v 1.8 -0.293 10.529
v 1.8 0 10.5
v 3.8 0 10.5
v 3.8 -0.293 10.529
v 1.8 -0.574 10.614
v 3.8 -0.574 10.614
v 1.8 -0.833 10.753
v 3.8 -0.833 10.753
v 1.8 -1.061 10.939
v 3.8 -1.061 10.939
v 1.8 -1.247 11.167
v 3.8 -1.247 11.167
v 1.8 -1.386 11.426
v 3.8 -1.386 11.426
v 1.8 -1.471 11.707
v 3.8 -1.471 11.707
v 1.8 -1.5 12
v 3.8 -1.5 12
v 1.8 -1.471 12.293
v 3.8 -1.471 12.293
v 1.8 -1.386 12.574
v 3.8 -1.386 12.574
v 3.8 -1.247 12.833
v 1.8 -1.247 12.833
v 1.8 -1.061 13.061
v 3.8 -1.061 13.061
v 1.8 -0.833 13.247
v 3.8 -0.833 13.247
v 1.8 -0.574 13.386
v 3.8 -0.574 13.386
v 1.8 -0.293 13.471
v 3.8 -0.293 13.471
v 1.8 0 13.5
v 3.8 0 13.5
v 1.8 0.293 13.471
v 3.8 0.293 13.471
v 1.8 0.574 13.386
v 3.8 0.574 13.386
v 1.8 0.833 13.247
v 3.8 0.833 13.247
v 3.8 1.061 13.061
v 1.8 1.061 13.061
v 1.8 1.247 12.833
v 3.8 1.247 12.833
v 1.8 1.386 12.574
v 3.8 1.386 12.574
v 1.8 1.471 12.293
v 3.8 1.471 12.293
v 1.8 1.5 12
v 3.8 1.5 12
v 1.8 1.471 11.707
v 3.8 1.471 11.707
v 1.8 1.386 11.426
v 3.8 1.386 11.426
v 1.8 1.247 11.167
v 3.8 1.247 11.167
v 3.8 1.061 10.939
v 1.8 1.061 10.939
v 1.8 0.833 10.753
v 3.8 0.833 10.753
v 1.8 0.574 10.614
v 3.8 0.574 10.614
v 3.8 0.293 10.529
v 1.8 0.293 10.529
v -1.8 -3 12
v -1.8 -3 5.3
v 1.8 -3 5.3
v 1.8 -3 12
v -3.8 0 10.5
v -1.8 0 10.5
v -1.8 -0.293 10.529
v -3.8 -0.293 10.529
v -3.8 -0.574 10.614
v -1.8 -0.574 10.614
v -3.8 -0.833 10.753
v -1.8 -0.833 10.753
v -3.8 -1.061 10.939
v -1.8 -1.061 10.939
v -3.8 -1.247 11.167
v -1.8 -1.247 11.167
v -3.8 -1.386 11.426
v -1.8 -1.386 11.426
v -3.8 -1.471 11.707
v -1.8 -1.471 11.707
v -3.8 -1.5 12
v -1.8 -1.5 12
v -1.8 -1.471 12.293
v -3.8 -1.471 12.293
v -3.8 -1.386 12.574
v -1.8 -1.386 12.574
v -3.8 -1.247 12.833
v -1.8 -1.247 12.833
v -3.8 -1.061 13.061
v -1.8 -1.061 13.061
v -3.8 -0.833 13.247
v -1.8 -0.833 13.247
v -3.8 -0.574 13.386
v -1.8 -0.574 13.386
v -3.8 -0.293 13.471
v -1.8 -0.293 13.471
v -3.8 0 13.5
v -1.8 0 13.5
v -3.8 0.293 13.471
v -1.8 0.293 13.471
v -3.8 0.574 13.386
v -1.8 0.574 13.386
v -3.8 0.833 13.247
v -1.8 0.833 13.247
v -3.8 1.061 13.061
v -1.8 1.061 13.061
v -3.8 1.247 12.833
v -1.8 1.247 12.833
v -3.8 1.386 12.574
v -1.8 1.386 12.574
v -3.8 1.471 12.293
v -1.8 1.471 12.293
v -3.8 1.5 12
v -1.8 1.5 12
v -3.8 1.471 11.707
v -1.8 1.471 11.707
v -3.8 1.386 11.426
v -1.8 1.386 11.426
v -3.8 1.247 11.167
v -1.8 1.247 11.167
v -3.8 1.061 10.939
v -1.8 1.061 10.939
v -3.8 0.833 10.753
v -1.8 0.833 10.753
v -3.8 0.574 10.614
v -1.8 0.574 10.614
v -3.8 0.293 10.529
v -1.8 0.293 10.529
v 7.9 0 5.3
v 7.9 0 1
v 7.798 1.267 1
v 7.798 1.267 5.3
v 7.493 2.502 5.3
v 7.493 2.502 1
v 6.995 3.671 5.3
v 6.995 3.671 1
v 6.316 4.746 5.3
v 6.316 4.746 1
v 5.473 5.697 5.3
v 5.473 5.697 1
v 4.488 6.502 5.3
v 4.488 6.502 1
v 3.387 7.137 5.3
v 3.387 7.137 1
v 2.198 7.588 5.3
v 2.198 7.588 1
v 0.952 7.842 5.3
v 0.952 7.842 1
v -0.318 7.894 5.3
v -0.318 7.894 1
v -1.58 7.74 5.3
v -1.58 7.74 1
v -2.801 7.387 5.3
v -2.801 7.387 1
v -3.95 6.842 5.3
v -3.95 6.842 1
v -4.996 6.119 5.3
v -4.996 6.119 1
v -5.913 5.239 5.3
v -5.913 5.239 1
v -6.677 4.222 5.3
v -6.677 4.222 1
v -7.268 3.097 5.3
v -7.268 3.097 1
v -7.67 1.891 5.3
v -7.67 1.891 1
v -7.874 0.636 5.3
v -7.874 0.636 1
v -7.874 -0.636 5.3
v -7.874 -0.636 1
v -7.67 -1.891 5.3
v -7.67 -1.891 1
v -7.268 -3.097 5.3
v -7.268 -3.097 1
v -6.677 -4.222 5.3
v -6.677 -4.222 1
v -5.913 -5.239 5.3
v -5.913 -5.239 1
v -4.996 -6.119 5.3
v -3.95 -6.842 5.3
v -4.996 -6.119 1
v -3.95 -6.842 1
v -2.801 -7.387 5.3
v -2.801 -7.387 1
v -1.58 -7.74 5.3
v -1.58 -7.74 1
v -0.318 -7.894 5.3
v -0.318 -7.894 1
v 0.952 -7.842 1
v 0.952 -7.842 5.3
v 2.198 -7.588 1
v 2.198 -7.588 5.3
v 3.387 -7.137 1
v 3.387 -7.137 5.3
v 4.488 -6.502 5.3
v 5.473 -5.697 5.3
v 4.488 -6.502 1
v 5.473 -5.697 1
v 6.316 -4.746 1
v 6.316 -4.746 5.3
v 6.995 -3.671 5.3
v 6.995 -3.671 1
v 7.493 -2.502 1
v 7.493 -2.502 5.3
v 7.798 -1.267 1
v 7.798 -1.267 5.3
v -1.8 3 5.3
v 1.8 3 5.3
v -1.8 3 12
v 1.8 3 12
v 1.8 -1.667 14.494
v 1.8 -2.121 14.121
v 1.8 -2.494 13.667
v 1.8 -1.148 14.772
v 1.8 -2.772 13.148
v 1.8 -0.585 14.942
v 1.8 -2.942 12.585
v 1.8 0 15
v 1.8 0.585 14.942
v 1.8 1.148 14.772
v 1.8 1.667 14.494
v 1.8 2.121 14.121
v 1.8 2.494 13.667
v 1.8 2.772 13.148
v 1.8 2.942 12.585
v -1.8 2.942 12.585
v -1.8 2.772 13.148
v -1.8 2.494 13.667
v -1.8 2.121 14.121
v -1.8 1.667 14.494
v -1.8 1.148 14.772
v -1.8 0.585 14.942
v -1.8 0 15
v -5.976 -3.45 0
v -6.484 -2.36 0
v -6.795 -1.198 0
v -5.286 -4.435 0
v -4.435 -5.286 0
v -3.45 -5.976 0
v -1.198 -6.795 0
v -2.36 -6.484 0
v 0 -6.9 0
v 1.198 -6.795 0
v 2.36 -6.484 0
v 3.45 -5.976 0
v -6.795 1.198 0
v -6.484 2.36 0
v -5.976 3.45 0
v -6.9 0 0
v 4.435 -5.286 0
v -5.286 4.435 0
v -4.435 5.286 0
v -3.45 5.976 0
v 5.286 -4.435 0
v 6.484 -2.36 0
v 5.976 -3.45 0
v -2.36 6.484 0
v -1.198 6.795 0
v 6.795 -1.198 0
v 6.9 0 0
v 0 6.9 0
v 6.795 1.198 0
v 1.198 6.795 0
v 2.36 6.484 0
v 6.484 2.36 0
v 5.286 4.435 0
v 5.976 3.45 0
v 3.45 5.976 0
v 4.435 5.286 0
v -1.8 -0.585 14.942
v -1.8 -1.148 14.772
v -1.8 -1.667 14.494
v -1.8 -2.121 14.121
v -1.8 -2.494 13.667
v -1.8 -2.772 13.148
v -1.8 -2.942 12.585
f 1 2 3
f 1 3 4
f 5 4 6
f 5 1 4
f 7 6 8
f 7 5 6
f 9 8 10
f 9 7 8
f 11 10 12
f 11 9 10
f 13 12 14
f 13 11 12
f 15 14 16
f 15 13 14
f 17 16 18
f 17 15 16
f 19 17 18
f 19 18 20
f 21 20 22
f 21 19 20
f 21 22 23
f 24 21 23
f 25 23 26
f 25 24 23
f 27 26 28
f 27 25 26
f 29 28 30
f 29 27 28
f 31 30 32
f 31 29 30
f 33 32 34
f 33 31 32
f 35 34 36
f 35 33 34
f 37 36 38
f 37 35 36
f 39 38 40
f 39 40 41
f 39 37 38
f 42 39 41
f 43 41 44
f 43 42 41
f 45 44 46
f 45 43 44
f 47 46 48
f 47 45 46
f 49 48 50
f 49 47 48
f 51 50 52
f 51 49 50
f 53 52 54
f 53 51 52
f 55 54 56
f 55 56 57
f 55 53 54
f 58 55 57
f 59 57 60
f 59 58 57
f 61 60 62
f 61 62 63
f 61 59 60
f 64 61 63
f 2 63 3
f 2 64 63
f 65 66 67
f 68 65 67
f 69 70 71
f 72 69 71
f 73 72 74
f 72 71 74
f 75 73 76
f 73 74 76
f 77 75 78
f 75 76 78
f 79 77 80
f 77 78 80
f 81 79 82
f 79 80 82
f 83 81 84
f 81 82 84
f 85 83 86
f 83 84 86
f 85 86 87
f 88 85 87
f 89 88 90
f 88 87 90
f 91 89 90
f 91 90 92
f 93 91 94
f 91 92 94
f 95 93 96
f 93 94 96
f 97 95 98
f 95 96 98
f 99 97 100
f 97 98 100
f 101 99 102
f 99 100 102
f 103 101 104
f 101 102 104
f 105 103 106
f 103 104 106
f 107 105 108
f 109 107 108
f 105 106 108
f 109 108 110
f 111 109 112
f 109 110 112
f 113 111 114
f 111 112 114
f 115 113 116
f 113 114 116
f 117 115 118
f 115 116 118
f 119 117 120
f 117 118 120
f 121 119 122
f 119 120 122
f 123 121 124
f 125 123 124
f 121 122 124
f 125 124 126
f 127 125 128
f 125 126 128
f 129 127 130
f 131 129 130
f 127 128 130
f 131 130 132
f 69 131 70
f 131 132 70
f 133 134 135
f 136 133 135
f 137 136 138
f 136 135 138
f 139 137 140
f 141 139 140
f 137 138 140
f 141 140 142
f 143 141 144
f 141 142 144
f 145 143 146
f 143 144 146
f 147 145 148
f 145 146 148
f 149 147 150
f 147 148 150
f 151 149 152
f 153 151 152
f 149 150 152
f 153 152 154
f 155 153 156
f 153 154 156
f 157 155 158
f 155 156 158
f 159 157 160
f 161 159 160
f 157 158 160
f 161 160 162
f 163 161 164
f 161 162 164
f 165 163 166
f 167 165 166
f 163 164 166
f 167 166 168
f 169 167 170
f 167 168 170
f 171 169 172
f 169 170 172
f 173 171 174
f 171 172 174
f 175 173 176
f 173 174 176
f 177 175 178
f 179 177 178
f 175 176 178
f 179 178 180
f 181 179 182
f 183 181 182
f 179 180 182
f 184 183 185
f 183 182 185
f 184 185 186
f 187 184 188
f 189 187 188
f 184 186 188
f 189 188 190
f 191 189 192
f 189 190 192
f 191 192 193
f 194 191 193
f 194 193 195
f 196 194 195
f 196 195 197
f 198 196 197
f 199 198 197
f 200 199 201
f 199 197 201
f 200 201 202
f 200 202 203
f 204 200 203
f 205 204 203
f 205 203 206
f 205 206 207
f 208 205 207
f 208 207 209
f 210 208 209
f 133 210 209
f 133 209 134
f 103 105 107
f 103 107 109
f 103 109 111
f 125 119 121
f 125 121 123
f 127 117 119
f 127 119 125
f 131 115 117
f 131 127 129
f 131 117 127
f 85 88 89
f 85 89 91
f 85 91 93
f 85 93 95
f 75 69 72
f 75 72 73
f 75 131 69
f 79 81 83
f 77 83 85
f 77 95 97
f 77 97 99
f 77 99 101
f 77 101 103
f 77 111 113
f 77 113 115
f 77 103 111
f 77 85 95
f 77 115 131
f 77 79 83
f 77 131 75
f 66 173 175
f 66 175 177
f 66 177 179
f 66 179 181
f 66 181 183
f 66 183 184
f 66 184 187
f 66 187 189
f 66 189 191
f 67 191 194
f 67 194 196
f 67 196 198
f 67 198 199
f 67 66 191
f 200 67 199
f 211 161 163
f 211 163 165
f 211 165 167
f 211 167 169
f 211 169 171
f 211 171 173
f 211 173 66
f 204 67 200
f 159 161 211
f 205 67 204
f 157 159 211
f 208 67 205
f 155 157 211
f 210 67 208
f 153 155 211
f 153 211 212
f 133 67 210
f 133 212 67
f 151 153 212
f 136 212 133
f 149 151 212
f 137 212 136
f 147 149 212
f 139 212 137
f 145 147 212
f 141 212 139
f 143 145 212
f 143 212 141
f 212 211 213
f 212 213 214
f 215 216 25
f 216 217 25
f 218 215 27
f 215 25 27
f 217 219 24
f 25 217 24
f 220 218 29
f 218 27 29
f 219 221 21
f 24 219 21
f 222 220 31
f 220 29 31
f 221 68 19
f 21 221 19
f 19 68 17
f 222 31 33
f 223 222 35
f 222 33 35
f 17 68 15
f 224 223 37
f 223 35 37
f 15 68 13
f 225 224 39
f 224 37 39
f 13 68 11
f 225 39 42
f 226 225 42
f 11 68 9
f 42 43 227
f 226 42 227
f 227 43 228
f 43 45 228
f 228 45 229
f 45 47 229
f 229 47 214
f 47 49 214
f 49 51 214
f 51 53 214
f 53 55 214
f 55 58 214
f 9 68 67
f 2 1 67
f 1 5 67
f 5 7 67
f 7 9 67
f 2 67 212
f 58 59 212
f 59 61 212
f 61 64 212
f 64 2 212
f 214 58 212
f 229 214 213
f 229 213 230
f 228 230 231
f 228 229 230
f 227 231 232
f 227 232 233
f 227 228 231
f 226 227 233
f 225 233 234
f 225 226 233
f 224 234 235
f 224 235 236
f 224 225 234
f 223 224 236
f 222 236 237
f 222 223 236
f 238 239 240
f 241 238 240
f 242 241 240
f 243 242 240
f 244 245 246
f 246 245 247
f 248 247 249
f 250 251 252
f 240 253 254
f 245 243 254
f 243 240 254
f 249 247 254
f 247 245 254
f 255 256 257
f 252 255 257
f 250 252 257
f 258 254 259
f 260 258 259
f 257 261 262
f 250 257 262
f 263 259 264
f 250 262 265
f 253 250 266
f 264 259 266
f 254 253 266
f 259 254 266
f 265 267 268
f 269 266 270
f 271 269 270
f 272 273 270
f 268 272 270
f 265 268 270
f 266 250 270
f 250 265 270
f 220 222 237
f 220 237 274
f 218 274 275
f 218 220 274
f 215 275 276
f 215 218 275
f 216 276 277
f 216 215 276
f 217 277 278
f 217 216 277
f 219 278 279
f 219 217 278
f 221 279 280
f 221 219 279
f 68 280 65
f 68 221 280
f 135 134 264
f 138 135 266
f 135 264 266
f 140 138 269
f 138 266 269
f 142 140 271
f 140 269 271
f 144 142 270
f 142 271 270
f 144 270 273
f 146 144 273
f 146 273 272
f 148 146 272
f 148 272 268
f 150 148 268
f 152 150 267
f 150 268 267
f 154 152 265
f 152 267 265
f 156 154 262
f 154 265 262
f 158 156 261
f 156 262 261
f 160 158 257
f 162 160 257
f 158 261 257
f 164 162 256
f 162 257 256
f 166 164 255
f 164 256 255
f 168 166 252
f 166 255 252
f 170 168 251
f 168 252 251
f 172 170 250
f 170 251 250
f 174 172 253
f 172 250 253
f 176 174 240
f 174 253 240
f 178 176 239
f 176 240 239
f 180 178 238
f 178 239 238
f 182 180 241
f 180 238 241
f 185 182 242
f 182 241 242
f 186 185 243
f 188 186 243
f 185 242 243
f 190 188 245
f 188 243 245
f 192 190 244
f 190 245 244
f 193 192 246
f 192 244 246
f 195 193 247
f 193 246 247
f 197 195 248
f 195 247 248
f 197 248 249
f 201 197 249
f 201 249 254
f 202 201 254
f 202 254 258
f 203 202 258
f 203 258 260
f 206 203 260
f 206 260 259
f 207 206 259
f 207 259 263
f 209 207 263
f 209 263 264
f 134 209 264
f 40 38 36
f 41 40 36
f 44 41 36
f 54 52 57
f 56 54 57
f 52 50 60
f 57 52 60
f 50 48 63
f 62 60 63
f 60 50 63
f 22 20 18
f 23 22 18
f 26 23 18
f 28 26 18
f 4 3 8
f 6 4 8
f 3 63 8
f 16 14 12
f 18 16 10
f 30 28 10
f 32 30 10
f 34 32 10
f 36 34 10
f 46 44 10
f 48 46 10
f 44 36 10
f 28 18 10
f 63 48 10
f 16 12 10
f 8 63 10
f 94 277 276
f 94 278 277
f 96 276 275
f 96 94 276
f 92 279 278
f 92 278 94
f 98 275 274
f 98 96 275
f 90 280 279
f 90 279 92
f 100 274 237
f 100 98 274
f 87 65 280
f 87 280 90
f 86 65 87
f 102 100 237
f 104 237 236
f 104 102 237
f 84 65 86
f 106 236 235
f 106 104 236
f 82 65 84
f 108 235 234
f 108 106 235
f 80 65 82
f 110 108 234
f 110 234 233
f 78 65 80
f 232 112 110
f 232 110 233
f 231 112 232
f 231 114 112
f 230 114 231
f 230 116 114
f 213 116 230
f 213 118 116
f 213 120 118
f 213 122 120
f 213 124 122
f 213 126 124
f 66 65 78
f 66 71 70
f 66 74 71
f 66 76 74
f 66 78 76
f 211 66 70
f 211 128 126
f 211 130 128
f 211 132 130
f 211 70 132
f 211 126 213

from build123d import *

# Parameters (mm, degrees)
SKETCH_1_R          = 7.9
EXTRUDE_1_DEPTH     = 5.3
SKETCH_2_W          = 3.6
SKETCH_2_H          = 6
EXTRUDE_2_DEPTH     = 9.7
CUT_EXTRUDE_START   = -3.6
CUT_EXTRUDE_1_DEPTH = 3.6
CHAMFER_1_SIZE      = 1
SKETCH_4_R          = 1.5
EXTRUDE_3_DEPTH     = 2


# Read off the part's stored shape, not the designer's step: 切除-拉伸1
with BuildPart() as part:
    # 草图1 → 凸台-拉伸1 (new body)
    with BuildSketch(Plane.XY):
        Circle(SKETCH_1_R)
    extrude(amount=EXTRUDE_1_DEPTH)

    # 草图2 → 凸台-拉伸2 (add)
    with BuildSketch(Plane.XY.offset(5.3)):
        Rectangle(SKETCH_2_W, SKETCH_2_H)
    extrude(amount=EXTRUDE_2_DEPTH)

    # 切除-拉伸1 outline → 切除-拉伸1 (cut)
    with BuildSketch(Plane.ZY.offset(1.8).offset(CUT_EXTRUDE_START)):
        with BuildLine():
            Line((15, 3), (12, 3))
            ThreePointArc((12, 3), (14.121320344, 2.121320344), (15, 0))
            Line((15, 0), (15, 3))
        make_face()
        with BuildLine():
            Line((15, -3), (15, 0))
            ThreePointArc((15, 0), (14.121320344, -2.121320344), (12, -3))
            Line((12, -3), (15, -3))
        make_face()
    extrude(amount=CUT_EXTRUDE_1_DEPTH, mode=Mode.SUBTRACT)

    # 倒角1
    chamfer_1_edges = [part.edges().sort_by_distance(p)[0] for p in [
        (-7.9, 0, 0),
    ]]
    chamfer(chamfer_1_edges, length=CHAMFER_1_SIZE)

    # 草图4 → 凸台-拉伸3 (add)
    with BuildSketch(Plane.ZY.offset(1.8)):
        with Locations(Location((12, 0, 0), (0, 0, 180))):
            Circle(SKETCH_4_R)
    extrude_3 = extrude(amount=EXTRUDE_3_DEPTH)

    # 镜向1: 凸台-拉伸3 across plane
    add(extrude_3.mirror(Plane(origin=(0, 0, 0), x_dir=(0, 0, 1), z_dir=(1, 0, 0))))


solid = part.part
